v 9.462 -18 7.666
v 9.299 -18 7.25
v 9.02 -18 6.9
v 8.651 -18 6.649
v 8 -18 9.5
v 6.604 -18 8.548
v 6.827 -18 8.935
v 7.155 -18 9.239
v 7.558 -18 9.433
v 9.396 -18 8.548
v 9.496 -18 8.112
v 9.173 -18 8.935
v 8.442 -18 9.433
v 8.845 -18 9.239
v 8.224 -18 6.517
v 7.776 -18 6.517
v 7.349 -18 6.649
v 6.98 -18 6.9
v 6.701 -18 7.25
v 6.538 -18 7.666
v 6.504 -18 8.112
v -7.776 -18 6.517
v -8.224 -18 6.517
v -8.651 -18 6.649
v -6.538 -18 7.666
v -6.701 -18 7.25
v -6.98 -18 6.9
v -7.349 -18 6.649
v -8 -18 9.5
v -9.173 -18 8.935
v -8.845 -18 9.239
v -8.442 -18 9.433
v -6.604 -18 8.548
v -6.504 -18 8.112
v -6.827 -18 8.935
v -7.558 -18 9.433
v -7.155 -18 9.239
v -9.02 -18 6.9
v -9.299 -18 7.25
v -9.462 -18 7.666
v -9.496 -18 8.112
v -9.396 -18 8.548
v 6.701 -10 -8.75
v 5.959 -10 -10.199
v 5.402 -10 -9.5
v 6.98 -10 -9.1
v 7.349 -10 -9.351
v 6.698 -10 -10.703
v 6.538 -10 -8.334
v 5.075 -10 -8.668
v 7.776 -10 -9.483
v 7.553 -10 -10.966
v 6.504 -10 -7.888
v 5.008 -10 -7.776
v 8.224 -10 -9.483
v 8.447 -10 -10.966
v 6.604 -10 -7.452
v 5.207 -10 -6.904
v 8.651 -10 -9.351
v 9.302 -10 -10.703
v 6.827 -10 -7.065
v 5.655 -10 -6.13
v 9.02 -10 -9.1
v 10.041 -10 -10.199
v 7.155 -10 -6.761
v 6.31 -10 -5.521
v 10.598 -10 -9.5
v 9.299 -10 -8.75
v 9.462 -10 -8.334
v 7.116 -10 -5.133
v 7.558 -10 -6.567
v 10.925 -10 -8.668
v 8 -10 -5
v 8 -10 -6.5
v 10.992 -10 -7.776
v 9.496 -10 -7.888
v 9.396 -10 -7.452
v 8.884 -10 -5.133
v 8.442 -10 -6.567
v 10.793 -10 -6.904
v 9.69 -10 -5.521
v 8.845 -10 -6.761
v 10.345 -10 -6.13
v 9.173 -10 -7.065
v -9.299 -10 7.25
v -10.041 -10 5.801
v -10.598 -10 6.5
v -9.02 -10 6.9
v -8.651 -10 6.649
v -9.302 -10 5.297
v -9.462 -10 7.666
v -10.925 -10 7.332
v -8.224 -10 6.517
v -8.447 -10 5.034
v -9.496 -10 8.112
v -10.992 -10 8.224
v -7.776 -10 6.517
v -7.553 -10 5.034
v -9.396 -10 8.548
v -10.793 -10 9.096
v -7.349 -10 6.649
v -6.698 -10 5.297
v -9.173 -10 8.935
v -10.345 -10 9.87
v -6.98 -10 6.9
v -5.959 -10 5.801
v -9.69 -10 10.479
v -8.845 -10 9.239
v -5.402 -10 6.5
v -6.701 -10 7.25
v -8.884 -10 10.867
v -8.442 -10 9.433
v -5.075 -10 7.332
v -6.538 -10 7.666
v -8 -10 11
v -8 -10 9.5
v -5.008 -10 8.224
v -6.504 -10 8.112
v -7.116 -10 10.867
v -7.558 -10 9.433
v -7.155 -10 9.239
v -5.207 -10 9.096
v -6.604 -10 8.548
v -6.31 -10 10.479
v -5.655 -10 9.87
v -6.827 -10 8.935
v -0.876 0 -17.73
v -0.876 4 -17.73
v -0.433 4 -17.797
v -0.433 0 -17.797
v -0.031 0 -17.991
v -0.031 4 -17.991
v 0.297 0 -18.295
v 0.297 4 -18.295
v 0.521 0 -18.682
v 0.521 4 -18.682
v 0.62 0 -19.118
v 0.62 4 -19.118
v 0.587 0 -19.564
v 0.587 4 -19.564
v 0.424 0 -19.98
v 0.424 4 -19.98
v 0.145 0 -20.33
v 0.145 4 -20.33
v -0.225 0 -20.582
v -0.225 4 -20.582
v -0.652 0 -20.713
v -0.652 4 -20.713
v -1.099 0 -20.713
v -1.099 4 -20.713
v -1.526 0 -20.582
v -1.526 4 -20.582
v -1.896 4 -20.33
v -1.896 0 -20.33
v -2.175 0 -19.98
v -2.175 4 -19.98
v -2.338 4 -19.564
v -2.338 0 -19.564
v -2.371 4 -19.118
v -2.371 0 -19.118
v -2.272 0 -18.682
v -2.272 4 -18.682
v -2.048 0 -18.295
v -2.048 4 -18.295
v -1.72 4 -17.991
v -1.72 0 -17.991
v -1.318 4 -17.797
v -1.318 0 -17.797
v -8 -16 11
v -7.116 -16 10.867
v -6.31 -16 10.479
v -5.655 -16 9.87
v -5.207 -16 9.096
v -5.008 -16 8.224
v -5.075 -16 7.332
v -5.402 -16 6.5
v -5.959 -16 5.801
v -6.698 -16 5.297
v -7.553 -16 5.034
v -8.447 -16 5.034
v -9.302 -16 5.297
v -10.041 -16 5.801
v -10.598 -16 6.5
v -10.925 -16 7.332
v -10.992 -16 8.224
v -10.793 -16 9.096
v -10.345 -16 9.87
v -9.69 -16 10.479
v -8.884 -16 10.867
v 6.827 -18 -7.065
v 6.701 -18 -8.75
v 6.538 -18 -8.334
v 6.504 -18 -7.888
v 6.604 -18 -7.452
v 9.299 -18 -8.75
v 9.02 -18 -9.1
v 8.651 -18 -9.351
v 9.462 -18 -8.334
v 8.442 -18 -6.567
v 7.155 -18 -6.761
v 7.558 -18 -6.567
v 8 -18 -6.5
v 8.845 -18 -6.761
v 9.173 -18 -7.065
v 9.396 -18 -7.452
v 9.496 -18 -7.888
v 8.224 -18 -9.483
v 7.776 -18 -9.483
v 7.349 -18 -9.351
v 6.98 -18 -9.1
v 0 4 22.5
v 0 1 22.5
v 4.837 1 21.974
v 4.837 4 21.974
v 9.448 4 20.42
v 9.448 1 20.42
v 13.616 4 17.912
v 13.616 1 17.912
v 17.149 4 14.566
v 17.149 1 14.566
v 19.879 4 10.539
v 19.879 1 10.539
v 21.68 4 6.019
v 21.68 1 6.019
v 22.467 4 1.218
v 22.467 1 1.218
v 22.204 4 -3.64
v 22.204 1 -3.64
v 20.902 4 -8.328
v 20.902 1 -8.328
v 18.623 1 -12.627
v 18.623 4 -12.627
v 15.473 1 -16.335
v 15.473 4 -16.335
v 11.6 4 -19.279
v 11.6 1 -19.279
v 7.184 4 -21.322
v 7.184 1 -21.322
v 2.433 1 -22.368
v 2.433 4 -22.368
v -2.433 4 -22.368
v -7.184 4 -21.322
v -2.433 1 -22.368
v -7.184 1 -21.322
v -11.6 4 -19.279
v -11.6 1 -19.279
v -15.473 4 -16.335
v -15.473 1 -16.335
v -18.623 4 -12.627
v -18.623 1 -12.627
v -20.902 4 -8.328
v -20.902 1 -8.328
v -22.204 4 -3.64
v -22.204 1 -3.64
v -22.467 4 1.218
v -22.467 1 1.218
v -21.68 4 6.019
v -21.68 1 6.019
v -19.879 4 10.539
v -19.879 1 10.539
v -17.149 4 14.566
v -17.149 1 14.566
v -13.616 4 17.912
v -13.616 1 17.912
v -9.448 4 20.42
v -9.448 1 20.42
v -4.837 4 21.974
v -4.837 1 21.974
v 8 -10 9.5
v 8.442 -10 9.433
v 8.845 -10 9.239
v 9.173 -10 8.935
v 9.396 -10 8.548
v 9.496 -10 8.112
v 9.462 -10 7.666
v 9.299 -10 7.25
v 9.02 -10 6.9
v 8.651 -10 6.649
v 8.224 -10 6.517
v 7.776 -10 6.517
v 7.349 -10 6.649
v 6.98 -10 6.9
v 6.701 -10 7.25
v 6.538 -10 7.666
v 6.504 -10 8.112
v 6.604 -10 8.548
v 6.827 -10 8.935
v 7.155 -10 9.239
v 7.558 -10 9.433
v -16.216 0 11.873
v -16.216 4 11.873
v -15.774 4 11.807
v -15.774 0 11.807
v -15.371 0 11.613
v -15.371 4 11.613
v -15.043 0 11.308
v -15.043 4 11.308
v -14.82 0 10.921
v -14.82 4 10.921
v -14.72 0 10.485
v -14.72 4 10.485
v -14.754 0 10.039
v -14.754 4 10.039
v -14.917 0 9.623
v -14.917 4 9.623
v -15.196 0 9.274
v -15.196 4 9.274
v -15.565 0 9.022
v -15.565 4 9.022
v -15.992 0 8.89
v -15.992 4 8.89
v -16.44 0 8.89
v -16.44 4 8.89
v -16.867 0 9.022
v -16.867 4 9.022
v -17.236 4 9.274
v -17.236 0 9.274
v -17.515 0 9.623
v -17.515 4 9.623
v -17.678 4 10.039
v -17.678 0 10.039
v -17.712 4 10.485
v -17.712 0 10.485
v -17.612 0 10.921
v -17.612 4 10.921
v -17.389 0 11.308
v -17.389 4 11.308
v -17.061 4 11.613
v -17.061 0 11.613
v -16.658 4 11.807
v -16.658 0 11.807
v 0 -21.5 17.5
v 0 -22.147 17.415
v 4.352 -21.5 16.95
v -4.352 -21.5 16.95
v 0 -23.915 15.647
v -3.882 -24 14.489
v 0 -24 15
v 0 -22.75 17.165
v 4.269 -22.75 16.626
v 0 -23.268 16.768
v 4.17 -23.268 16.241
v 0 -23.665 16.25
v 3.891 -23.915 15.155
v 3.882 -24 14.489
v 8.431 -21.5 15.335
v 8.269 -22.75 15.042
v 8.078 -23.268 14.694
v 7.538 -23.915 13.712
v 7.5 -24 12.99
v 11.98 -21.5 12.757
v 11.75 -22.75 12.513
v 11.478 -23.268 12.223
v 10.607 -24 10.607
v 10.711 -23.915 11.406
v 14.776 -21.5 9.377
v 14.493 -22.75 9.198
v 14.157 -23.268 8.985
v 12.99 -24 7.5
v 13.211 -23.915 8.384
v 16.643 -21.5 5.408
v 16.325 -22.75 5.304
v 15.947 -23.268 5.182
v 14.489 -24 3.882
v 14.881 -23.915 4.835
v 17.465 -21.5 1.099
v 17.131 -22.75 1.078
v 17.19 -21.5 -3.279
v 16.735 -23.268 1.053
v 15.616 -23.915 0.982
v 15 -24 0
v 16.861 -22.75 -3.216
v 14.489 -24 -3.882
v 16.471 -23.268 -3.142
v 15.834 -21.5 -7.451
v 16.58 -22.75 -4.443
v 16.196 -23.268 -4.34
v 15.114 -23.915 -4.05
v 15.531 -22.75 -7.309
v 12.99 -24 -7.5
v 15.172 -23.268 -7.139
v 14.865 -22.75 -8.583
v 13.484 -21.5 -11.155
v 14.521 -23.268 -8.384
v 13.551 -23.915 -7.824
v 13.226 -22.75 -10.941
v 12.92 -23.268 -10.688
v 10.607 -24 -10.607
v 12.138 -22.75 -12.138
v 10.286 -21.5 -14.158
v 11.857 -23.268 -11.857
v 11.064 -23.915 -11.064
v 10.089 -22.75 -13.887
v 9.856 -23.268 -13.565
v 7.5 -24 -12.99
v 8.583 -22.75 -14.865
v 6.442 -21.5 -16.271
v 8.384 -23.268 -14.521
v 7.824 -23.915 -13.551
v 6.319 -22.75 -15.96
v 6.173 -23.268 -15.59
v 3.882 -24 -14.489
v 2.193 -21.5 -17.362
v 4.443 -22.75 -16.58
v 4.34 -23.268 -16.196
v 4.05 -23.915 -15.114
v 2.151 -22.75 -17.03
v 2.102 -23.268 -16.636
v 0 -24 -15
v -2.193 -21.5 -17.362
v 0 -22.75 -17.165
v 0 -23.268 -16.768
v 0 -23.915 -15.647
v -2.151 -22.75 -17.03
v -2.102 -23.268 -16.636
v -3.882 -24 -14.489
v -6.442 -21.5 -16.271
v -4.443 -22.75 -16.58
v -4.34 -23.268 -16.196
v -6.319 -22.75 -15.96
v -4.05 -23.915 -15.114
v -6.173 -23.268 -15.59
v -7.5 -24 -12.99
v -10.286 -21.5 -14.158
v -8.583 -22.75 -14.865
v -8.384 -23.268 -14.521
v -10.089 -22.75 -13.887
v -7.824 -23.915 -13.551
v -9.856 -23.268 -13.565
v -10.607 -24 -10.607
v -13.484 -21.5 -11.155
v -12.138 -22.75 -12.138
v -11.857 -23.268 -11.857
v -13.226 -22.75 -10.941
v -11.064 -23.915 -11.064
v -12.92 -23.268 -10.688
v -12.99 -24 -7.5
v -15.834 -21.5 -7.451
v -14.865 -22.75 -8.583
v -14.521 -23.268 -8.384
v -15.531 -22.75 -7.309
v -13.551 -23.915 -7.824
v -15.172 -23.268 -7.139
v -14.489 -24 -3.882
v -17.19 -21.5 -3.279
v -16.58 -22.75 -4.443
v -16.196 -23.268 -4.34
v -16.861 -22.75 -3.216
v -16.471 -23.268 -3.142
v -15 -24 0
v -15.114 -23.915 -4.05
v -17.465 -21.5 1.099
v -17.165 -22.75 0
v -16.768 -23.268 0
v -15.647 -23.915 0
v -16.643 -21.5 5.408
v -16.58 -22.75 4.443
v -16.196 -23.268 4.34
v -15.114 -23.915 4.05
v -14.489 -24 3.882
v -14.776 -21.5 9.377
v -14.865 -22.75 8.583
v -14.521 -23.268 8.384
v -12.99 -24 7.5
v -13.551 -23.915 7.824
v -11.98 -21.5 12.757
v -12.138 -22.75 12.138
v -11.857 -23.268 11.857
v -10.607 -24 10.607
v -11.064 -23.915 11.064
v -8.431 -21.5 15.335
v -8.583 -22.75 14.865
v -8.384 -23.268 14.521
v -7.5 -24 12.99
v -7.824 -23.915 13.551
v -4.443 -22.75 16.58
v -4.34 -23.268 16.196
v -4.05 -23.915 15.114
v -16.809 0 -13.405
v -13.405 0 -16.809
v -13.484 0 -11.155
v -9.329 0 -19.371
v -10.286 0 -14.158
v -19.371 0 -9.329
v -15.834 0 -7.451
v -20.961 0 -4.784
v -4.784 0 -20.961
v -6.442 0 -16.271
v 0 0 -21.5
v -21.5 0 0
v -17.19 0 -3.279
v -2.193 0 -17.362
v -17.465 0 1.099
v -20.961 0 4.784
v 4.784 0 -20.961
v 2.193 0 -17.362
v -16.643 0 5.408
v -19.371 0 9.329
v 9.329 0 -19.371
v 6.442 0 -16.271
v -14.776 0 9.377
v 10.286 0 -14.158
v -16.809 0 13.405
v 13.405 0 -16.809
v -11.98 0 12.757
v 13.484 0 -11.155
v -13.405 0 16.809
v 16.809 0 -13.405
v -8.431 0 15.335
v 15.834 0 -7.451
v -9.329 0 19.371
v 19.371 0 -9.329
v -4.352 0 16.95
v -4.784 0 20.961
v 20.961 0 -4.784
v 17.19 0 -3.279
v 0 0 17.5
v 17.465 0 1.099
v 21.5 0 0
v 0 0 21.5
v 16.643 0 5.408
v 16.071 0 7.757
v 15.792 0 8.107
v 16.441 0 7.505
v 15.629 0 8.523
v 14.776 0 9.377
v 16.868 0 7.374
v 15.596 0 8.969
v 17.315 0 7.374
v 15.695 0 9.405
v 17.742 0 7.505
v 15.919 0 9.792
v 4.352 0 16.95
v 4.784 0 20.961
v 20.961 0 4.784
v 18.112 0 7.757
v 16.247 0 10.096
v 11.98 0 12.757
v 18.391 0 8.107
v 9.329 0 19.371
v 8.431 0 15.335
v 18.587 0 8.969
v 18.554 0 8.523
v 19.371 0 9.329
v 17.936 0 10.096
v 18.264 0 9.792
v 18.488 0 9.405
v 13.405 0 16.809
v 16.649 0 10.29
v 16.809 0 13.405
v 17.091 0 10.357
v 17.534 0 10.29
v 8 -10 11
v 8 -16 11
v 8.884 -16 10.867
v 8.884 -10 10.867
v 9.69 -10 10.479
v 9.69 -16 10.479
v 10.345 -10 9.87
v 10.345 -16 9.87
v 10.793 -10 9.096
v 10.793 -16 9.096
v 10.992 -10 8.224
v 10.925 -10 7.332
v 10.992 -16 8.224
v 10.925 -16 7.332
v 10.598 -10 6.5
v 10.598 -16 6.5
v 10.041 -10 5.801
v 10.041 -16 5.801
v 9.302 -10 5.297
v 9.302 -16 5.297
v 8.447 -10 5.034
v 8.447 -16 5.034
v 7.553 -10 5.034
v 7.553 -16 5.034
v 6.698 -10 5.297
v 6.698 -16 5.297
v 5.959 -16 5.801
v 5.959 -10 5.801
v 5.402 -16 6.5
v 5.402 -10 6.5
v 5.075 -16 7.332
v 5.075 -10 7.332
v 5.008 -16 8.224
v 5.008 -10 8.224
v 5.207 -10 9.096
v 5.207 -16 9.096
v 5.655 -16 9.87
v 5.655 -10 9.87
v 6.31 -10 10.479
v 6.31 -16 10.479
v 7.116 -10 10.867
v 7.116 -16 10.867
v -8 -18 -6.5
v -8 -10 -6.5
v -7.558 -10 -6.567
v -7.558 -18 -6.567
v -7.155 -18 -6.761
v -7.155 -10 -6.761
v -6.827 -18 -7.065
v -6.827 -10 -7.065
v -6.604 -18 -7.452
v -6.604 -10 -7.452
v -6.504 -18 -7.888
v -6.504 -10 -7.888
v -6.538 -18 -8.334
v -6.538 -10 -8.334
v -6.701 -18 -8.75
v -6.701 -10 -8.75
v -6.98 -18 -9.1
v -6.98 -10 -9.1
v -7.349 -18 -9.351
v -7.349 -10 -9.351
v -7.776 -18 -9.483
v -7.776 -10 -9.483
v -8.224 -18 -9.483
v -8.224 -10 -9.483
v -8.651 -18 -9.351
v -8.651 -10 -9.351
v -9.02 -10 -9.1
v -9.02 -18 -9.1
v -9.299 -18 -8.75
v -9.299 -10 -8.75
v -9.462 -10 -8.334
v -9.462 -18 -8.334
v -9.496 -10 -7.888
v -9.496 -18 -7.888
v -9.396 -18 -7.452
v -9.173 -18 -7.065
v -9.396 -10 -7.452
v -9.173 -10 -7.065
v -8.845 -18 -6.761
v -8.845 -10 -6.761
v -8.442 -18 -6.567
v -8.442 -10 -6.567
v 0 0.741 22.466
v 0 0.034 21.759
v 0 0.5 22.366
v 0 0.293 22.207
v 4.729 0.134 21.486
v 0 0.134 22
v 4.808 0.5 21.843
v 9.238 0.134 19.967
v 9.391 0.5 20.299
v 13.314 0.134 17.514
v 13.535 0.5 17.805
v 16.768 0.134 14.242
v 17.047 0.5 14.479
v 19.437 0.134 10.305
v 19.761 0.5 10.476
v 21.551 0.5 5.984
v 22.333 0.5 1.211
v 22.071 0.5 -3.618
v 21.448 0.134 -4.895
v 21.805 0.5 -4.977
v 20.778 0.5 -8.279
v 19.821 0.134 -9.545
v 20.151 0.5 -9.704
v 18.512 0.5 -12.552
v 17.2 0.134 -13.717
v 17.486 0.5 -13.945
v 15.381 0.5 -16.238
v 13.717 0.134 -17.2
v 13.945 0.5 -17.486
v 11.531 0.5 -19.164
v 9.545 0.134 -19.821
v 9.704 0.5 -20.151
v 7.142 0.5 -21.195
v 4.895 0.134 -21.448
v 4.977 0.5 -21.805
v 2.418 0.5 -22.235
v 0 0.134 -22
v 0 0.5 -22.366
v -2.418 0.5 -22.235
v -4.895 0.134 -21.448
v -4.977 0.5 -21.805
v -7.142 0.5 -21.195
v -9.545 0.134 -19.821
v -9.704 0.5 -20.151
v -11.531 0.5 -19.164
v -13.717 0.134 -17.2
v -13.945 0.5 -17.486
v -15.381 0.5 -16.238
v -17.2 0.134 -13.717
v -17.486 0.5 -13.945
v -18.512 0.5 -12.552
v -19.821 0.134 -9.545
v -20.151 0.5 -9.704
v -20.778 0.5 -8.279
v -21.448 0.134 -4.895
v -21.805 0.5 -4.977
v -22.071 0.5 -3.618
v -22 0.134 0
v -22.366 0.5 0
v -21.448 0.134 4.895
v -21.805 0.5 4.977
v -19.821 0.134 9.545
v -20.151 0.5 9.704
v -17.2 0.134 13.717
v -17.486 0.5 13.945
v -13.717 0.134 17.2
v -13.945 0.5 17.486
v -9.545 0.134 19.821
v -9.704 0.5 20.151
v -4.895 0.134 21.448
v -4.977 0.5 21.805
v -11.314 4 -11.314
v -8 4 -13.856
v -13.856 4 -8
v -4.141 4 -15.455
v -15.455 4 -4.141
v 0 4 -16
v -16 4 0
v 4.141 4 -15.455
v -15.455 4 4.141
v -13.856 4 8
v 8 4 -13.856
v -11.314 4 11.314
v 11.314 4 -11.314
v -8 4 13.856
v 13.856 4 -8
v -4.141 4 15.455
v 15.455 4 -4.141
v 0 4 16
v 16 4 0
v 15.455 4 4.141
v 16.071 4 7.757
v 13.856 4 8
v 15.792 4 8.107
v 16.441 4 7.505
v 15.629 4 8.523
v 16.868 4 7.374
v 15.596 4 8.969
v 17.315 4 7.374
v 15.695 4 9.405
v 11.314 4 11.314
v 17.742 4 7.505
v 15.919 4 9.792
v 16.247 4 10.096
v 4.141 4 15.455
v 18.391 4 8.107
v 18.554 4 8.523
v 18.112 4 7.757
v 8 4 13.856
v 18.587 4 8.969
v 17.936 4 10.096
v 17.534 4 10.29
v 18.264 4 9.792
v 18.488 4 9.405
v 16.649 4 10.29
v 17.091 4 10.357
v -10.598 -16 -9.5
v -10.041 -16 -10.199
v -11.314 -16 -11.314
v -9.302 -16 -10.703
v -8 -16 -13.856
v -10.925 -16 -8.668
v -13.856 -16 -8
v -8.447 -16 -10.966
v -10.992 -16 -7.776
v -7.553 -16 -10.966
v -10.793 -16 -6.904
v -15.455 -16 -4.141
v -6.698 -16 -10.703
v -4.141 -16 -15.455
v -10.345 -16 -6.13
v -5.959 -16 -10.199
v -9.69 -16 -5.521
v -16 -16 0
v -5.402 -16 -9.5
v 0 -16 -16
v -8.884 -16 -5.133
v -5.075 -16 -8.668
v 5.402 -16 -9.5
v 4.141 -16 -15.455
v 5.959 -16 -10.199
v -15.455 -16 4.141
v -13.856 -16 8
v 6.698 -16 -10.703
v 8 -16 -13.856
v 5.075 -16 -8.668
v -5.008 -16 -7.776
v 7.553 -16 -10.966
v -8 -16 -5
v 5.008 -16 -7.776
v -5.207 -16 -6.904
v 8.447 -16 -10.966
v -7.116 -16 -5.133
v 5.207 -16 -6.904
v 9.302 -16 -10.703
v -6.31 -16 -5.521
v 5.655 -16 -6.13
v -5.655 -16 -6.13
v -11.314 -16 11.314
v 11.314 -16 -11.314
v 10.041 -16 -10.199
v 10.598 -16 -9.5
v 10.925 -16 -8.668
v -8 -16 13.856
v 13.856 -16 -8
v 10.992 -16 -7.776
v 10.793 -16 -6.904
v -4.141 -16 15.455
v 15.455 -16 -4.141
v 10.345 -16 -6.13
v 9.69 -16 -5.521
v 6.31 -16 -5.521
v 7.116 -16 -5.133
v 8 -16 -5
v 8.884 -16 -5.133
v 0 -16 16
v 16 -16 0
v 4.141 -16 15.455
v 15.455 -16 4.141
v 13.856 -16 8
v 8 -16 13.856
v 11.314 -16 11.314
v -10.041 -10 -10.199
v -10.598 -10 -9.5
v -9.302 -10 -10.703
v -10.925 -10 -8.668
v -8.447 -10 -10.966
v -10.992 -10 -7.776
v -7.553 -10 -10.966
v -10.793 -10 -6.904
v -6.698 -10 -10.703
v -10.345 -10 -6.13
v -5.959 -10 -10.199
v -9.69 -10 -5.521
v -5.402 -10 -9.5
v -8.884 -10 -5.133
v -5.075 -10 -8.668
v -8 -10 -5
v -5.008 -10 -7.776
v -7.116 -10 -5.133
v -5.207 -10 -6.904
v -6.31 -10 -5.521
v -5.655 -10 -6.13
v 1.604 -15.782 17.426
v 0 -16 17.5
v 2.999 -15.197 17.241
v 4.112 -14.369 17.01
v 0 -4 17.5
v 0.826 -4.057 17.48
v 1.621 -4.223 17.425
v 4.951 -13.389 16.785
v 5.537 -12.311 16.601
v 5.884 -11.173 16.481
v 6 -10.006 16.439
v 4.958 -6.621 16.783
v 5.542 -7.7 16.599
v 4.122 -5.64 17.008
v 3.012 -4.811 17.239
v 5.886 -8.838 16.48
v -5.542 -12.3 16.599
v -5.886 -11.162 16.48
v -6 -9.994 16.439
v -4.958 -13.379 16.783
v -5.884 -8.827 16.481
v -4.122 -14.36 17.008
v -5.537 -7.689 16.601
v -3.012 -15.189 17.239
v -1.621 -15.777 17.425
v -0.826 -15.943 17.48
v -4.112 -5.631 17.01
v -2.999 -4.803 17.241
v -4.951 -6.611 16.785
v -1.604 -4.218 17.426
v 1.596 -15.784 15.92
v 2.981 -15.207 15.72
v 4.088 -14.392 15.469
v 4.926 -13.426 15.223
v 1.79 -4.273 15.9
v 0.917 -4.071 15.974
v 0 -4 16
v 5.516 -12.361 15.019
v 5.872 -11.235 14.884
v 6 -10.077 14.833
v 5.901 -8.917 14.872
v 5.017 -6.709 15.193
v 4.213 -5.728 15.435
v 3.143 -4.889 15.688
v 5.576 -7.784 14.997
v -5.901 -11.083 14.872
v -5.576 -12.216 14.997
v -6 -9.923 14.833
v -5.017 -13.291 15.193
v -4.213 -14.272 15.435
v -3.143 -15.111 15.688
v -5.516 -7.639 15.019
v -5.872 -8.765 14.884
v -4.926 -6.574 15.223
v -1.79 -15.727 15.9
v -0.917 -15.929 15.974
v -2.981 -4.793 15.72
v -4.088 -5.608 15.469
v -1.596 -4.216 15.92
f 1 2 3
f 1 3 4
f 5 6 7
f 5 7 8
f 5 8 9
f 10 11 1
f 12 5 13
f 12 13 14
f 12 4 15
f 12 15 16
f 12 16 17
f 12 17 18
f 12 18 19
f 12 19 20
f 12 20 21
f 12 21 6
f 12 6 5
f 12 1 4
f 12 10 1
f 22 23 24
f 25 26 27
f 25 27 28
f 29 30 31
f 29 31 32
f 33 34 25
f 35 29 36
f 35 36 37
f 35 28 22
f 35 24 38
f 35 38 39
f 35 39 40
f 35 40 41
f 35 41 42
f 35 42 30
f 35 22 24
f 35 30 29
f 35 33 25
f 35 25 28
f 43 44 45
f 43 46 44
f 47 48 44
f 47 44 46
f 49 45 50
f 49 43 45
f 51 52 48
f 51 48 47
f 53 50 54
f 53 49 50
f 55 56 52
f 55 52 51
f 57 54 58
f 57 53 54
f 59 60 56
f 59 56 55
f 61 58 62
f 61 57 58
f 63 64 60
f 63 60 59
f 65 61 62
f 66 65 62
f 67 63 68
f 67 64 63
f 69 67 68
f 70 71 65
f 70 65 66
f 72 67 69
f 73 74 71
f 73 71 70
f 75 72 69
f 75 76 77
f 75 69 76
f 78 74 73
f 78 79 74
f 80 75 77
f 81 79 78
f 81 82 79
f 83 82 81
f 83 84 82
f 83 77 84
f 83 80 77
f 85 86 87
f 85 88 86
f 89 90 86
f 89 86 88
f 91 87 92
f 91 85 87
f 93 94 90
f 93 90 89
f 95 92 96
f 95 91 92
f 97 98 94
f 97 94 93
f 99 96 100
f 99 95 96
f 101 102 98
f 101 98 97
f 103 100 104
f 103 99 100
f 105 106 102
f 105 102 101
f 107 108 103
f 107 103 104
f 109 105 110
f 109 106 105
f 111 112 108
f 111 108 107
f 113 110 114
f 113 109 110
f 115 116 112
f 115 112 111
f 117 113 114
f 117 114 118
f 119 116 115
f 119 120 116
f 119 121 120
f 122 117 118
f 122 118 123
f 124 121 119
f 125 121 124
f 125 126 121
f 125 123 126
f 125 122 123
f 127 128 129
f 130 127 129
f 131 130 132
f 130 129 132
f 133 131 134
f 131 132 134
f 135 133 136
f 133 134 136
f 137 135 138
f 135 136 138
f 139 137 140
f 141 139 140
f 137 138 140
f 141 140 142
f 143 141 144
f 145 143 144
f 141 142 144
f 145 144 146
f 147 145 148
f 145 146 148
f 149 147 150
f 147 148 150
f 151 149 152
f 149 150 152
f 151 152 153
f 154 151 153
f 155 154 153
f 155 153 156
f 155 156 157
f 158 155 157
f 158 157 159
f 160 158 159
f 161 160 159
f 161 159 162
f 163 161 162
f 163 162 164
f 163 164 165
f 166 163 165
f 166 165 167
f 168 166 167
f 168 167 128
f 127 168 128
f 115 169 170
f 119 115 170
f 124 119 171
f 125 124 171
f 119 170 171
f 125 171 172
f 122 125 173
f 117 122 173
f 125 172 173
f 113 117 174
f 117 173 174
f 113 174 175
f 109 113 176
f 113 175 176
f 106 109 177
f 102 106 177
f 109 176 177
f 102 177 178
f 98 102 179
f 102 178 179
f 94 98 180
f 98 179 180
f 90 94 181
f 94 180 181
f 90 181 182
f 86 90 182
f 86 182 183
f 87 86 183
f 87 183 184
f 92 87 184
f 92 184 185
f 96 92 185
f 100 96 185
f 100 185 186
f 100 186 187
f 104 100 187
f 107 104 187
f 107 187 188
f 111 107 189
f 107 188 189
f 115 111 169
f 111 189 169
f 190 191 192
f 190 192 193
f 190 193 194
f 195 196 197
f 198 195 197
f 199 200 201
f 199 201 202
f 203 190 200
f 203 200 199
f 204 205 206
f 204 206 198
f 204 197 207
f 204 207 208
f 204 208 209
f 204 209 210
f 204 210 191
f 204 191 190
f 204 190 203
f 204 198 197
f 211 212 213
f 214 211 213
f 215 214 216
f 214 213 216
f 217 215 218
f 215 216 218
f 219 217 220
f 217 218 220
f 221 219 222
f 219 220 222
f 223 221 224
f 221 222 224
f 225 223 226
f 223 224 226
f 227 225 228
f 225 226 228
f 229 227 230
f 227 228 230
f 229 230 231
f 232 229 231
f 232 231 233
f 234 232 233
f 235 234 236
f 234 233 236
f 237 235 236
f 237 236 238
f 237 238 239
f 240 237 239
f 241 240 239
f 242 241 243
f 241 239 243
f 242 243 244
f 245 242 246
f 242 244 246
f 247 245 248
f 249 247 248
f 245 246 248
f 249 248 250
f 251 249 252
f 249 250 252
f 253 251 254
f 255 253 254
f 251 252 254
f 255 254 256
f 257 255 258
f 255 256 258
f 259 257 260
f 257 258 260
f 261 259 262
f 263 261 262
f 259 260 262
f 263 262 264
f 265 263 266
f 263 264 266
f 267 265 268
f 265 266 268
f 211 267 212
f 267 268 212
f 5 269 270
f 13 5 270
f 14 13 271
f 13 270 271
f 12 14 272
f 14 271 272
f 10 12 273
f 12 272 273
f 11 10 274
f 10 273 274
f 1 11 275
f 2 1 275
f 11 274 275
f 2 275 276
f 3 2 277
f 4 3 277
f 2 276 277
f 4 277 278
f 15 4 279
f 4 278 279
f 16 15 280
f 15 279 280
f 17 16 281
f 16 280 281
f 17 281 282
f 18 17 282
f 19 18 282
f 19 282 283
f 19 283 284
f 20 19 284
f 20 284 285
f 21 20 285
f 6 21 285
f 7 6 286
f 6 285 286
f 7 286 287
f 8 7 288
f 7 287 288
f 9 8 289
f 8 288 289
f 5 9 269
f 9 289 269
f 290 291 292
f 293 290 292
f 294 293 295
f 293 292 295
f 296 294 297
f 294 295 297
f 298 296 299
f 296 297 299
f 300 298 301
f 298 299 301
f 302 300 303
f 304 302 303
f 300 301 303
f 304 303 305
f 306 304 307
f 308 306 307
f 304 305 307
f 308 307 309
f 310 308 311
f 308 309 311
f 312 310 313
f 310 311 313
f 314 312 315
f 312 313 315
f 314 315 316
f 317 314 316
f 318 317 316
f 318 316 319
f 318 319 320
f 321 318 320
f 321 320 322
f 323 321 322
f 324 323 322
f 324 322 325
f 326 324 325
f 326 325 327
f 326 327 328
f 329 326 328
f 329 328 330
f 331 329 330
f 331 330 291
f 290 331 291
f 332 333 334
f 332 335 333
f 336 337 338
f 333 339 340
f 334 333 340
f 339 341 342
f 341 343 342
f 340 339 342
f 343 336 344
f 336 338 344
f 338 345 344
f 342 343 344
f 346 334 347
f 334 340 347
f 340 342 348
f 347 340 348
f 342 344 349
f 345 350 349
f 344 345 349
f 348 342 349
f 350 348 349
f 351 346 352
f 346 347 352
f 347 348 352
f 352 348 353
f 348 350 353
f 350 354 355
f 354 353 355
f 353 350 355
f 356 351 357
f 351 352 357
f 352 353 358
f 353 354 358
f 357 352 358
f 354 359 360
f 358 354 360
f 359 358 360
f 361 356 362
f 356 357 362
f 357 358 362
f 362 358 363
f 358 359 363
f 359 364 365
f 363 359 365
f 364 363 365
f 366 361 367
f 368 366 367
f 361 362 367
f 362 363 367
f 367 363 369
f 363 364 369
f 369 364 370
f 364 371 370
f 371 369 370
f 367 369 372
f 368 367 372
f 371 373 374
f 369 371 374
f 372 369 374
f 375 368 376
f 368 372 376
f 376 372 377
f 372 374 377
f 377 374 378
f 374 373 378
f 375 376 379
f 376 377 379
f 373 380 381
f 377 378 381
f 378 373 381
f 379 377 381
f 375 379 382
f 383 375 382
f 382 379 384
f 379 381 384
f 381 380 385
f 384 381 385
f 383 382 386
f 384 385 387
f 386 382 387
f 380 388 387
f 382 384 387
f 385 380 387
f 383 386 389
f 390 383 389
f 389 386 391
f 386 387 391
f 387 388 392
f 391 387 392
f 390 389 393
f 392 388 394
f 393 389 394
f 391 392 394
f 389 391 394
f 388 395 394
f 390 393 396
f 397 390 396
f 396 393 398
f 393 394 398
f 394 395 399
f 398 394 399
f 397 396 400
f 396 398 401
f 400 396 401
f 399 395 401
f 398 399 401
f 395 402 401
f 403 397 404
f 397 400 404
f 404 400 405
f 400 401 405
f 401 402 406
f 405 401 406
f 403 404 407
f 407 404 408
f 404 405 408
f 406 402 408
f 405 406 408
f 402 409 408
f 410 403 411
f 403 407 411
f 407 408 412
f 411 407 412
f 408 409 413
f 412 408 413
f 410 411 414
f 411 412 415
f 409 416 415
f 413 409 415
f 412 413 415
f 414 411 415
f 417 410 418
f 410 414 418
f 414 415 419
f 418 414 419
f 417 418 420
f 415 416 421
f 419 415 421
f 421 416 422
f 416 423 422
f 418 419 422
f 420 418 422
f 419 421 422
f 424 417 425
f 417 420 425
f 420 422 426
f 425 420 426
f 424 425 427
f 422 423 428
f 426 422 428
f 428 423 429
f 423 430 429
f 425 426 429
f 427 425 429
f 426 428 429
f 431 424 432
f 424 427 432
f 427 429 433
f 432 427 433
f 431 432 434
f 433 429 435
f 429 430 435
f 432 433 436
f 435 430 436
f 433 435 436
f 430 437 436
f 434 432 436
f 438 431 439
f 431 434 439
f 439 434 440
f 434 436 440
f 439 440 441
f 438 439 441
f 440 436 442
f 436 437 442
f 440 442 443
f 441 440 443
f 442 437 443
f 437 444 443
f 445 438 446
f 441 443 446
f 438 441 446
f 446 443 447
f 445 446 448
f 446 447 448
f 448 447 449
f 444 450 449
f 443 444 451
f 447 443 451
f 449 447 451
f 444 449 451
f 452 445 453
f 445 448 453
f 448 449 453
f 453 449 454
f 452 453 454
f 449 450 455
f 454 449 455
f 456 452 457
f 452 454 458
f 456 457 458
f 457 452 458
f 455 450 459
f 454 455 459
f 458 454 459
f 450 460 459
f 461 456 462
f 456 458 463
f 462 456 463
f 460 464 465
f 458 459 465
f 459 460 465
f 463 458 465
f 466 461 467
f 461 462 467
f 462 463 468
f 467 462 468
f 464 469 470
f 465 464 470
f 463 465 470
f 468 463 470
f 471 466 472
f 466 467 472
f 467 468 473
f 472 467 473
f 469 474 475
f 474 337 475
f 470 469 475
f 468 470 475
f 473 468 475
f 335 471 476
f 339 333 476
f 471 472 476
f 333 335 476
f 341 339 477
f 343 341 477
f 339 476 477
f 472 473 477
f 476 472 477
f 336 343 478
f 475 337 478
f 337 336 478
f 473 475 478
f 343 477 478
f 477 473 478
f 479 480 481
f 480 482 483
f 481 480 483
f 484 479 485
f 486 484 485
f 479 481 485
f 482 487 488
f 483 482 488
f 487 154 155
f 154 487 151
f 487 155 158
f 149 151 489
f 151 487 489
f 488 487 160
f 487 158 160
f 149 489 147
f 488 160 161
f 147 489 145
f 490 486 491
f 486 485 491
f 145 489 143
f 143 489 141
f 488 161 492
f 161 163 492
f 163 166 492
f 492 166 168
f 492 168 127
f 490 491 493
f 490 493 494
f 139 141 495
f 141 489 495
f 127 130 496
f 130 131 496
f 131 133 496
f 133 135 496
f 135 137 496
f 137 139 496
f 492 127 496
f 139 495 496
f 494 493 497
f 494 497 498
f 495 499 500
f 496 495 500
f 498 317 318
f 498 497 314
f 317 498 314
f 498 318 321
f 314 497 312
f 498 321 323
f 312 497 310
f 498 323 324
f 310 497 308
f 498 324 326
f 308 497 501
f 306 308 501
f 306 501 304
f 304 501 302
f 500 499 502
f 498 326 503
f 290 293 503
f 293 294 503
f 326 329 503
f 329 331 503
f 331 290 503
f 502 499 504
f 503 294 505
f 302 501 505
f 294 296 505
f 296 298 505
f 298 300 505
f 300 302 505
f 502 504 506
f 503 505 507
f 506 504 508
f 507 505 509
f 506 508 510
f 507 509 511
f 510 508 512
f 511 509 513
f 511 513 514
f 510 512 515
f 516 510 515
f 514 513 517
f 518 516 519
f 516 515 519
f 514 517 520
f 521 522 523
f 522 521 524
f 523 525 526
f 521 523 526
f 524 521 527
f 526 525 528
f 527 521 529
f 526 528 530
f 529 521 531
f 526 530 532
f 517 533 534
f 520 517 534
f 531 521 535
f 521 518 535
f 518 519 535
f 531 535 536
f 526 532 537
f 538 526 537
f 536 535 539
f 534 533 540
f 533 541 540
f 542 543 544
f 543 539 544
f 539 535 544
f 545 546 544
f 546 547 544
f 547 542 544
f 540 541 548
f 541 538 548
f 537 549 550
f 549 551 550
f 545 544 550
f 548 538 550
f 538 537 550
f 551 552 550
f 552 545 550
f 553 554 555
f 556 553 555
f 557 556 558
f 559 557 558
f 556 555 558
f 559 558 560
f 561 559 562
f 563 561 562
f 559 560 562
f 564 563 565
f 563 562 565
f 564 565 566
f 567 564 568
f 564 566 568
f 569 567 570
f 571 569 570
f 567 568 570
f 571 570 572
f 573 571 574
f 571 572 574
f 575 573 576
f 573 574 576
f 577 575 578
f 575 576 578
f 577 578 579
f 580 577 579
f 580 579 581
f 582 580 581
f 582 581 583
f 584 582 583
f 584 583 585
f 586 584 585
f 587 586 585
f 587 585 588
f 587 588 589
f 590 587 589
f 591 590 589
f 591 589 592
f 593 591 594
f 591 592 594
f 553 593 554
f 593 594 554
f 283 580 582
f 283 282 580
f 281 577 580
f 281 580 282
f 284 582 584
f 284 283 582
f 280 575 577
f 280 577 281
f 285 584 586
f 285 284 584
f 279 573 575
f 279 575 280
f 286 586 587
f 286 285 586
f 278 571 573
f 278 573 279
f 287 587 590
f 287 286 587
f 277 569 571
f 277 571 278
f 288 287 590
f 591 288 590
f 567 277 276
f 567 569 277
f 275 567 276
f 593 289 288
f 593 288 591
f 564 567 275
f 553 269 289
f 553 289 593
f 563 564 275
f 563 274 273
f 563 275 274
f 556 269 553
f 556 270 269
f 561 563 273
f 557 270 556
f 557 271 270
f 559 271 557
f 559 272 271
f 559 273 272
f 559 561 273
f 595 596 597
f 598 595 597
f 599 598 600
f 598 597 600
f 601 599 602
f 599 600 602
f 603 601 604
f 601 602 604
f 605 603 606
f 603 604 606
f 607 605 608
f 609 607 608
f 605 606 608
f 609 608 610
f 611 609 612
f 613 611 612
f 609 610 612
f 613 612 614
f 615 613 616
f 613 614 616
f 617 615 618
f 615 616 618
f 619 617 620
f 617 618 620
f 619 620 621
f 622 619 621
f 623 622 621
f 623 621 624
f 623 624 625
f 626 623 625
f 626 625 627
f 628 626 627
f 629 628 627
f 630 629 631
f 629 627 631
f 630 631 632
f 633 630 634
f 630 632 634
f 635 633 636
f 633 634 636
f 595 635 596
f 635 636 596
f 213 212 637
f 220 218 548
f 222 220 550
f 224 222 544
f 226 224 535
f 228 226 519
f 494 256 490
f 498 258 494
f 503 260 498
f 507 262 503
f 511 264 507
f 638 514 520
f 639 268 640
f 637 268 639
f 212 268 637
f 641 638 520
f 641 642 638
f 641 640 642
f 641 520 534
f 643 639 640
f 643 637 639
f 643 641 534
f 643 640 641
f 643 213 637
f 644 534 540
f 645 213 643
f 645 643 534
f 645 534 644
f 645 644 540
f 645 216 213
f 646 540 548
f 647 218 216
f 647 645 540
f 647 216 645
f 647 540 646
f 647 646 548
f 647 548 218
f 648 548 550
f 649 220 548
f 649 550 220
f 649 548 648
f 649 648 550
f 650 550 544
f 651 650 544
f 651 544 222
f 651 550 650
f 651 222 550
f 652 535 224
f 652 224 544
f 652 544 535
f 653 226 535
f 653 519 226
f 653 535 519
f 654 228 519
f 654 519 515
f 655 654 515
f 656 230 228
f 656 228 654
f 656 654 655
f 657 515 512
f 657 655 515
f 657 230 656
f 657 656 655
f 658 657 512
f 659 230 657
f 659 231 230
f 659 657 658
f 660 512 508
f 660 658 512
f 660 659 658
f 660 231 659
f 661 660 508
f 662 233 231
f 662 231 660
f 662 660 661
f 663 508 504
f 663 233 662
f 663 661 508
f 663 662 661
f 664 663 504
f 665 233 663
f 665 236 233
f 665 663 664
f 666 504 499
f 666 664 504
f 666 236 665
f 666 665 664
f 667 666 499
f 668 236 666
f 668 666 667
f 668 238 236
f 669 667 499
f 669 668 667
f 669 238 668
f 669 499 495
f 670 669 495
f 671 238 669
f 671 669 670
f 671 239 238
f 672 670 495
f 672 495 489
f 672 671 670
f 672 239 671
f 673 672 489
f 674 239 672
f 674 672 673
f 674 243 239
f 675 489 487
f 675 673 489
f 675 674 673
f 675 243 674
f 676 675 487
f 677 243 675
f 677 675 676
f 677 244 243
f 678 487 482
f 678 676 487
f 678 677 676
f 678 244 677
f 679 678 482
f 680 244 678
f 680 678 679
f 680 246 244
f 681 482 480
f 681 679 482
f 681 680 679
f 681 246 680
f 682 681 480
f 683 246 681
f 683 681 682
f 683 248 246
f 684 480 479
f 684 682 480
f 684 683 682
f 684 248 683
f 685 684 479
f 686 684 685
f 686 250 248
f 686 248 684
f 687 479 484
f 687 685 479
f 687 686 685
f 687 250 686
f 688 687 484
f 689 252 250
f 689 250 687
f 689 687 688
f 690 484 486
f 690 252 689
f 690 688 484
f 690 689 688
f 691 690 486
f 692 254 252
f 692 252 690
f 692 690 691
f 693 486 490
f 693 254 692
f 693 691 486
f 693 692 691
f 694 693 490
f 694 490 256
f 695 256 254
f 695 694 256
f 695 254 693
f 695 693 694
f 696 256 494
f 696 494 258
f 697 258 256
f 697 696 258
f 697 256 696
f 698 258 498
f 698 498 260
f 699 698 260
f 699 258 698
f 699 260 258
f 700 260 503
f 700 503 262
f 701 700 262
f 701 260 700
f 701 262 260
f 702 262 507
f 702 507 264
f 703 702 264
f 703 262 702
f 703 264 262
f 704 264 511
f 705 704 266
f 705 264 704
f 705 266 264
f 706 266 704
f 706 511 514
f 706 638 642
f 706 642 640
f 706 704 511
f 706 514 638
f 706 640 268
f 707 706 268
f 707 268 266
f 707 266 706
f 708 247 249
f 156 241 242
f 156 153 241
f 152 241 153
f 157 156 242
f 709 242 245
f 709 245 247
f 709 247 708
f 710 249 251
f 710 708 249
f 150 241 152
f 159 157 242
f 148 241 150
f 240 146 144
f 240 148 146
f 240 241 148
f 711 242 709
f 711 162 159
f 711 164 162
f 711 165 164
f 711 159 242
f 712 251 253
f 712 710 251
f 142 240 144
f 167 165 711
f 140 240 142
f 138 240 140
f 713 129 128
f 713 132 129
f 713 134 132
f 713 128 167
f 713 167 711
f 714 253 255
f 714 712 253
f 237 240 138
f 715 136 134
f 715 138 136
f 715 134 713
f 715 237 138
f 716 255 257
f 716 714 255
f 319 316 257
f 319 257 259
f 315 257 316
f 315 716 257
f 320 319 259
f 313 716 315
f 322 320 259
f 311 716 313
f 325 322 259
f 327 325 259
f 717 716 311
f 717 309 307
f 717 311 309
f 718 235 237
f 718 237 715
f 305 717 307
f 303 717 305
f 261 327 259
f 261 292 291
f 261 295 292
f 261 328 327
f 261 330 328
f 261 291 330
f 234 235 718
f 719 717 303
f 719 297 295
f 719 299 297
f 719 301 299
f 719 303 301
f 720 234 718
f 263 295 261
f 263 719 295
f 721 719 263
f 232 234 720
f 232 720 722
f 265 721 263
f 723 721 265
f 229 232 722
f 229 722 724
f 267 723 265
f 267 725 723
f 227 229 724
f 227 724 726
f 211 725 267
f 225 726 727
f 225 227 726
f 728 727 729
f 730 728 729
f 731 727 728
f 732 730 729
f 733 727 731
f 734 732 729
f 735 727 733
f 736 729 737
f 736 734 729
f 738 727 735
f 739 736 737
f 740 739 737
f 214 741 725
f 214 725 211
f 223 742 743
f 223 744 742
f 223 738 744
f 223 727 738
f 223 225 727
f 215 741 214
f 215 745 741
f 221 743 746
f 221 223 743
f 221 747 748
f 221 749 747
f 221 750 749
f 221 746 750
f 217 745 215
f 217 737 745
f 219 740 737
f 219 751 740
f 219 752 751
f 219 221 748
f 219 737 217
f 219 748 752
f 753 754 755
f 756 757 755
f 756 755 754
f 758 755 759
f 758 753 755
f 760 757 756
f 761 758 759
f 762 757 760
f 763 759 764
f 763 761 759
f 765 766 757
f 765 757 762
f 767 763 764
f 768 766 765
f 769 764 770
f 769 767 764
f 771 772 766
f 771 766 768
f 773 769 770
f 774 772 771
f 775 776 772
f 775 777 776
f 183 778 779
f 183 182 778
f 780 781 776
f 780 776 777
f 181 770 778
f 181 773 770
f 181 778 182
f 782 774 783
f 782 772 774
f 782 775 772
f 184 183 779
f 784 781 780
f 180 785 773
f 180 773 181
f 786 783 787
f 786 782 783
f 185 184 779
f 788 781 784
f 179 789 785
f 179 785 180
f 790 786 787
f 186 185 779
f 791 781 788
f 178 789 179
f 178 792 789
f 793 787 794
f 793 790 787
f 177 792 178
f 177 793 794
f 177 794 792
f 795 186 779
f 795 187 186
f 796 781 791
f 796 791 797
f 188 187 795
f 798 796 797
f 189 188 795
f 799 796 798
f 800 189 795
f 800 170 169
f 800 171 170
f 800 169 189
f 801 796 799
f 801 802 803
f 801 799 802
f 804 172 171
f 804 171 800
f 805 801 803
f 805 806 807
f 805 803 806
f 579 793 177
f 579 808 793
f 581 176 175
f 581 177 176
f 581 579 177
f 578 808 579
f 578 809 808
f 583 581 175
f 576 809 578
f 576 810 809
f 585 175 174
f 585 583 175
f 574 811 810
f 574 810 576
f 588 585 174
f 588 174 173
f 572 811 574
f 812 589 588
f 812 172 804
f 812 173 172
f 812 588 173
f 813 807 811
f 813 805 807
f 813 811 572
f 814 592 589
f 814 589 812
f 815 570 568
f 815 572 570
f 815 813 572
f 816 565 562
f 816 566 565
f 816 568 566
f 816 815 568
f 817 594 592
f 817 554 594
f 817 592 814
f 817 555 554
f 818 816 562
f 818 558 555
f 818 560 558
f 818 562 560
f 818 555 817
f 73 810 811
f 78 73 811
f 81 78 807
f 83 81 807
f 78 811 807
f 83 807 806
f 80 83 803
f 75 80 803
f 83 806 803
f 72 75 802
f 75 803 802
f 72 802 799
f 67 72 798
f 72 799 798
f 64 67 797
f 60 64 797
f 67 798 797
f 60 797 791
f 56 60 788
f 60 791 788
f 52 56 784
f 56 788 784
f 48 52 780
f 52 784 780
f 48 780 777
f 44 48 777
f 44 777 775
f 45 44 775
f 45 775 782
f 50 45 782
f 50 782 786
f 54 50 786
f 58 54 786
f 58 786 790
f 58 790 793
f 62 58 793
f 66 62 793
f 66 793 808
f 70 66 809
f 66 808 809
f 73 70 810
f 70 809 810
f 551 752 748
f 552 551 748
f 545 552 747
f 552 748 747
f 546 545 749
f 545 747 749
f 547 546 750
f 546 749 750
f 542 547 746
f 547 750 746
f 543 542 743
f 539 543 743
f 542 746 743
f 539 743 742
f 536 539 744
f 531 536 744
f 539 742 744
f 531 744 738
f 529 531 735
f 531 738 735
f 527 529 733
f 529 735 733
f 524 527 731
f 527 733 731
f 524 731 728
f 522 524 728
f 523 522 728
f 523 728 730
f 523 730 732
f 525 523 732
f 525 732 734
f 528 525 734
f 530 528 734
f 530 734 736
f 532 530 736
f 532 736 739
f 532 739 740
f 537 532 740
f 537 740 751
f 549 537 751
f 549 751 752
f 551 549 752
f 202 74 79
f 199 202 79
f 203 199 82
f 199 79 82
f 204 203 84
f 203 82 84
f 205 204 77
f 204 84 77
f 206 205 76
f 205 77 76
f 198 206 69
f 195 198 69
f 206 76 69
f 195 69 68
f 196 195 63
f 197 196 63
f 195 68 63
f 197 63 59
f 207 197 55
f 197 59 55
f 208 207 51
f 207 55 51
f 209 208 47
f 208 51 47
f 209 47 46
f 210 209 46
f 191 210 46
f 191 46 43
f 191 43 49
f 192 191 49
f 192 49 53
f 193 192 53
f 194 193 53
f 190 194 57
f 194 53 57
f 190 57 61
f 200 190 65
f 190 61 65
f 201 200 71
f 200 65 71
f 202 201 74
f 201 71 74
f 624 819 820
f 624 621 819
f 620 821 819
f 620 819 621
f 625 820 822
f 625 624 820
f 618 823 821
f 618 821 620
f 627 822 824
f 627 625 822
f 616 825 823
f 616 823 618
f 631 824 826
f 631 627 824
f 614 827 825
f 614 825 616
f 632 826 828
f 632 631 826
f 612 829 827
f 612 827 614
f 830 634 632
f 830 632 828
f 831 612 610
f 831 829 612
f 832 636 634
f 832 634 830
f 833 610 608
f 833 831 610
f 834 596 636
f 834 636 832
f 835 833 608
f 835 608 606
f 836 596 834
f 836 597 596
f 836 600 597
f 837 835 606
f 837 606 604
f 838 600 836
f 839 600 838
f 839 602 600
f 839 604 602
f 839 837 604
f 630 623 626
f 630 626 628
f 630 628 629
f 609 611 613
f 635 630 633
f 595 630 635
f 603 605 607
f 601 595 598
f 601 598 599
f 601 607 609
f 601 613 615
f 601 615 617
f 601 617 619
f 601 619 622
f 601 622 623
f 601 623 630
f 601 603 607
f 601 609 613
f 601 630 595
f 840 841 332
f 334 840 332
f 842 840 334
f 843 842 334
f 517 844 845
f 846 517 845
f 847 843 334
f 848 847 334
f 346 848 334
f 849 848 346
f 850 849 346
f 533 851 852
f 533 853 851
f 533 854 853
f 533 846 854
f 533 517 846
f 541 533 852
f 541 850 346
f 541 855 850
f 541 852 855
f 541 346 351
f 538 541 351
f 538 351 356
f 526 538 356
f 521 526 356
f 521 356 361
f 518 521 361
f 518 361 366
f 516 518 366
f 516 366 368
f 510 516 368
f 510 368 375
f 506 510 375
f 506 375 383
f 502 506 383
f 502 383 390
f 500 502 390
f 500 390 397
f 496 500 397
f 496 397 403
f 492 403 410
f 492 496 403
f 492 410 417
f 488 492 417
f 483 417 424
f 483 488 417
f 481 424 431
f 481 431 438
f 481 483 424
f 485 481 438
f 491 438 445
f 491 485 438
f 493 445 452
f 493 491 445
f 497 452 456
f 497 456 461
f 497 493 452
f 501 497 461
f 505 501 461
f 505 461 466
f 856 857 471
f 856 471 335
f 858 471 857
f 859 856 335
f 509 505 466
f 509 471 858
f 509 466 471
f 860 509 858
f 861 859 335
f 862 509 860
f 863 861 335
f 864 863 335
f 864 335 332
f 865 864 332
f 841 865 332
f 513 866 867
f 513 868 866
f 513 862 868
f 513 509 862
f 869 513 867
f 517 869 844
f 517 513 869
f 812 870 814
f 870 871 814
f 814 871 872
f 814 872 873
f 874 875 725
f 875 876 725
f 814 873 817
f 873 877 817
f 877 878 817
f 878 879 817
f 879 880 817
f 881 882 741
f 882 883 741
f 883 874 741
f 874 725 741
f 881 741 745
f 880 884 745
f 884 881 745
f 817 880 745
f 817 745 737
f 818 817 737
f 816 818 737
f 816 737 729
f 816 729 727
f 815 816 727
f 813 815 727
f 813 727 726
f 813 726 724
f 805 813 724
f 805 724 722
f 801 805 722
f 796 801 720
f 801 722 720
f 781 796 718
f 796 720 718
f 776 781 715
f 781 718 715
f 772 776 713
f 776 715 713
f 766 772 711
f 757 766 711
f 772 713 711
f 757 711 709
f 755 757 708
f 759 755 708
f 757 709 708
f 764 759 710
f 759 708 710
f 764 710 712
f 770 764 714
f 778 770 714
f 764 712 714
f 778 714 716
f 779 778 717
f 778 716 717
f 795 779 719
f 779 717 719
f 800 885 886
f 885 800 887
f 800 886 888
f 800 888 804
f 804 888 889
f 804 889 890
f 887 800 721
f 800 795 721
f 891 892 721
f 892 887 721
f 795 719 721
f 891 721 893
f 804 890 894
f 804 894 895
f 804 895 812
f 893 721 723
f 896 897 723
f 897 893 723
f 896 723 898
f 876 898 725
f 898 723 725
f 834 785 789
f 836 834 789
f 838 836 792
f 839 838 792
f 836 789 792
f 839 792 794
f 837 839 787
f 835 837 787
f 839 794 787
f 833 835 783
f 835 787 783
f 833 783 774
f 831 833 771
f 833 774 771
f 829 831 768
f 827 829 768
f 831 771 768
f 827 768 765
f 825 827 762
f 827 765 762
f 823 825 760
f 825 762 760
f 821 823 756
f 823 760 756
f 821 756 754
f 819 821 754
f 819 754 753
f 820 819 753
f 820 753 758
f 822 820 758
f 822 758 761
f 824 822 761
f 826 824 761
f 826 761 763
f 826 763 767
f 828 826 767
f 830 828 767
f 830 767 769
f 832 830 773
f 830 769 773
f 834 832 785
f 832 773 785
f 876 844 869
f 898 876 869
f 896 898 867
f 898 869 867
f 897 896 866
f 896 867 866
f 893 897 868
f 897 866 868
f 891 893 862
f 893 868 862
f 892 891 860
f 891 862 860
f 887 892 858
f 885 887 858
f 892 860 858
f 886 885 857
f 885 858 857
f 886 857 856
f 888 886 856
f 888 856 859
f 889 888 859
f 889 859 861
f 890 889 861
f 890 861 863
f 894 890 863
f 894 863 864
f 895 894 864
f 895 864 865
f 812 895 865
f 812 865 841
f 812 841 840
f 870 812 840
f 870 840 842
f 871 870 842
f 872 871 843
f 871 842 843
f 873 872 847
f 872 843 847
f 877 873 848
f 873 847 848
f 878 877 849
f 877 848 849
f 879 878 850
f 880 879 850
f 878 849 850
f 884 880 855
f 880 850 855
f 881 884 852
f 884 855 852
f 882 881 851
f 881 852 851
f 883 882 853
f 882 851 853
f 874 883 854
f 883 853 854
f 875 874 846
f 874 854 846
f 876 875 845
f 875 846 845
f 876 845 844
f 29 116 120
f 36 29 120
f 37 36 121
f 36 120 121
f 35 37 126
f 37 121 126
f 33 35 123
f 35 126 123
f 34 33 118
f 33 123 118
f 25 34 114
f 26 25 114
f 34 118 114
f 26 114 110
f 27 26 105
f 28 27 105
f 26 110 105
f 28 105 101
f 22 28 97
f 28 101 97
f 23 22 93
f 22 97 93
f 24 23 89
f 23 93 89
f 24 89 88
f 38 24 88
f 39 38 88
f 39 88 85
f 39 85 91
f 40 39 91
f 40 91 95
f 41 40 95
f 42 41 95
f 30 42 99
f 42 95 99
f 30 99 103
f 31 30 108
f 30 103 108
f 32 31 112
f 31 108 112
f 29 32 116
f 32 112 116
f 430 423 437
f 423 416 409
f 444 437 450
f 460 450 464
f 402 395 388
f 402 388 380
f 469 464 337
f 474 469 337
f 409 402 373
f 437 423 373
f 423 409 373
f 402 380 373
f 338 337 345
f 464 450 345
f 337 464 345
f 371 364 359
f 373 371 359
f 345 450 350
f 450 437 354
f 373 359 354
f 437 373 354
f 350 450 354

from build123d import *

# Parameters (mm, degrees)
SKETCH1_R               = 22.5
BOSS_EXTRUDE1_DEPTH     = 4
SKETCH2_R               = 17.5
BOSS_EXTRUDE2_DEPTH     = 24
SKETCH3_R               = 16
CUT_EXTRUDE1_DEPTH      = 20
SKETCH4_R               = 3
BOSS_EXTRUDE3_DEPTH     = 6
SKETCH6_R               = 1.5
CUT_EXTRUDE3_DEPTH      = 8
SKETCH7_R               = 1.5
CUT_EXTRUDE4_DEPTH      = 10
CUT_EXTRUDE5_REACH      = 53.79
CUT_EXTRUDE5_END_RADIUS = 16
SKETCH10_R              = 6
FILLET1_R               = 2.5
FILLET2_R               = 1


with BuildPart() as part:
    # Sketch1 → Boss-Extrude1 (new body)
    with BuildSketch(Plane(origin=(0, 0, 0), x_dir=(1, 0, 0), z_dir=(0, 1, 0))):
        with Locations(Location((0, 0, 0), (0, 0, 270))):
            Circle(SKETCH1_R)
    extrude(amount=BOSS_EXTRUDE1_DEPTH)

    # Sketch2 → Boss-Extrude2 (add)
    with BuildSketch(Plane(origin=(0, 0, 0), x_dir=(1, 0, 0), z_dir=(0, 1, 0))):
        with Locations(Location((0, 0, 0), (0, 0, 270))):
            Circle(SKETCH2_R)
    extrude(amount=-BOSS_EXTRUDE2_DEPTH)

    # Sketch3 → Cut-Extrude1 (cut)
    with BuildSketch(Plane(origin=(0, 4, 0), x_dir=(1, 0, 0), z_dir=(0, 1, 0))):
        with Locations(Location((0, 0, 0), (0, 0, 270))):
            Circle(SKETCH3_R)
    extrude(amount=-CUT_EXTRUDE1_DEPTH, mode=Mode.SUBTRACT)

    # Sketch4 → Boss-Extrude3 (add)
    with BuildSketch(Plane(origin=(0, -16, 0), x_dir=(1, 0, 0), z_dir=(0, 1, 0))):
        with Locations(Location((-8, 8, 0), (0, 0, 270))):
            Circle(SKETCH4_R)
        with Locations(Location((8, 8, 0), (0, 0, 270))):
            Circle(SKETCH4_R)
        with Locations(Location((-8, -8, 0), (0, 0, 270))):
            Circle(SKETCH4_R)
        with Locations(Location((8, -8, 0), (0, 0, 270))):
            Circle(SKETCH4_R)
    extrude(amount=BOSS_EXTRUDE3_DEPTH)

    # Sketch6 → Cut-Extrude3 (cut)
    with BuildSketch(Plane(origin=(0, -10, 0), x_dir=(1, 0, 0), z_dir=(0, 1, 0))):
        with Locations(Location((-8, 8, 0), (0, 0, 270))):
            Circle(SKETCH6_R)
        with Locations(Location((8, 8, 0), (0, 0, 270))):
            Circle(SKETCH6_R)
        with Locations(Location((8, -8, 0), (0, 0, 270))):
            Circle(SKETCH6_R)
        with Locations(Location((-8, -8, 0), (0, 0, 270))):
            Circle(SKETCH6_R)
    extrude(amount=-CUT_EXTRUDE3_DEPTH, mode=Mode.SUBTRACT)

    # Sketch7 → Cut-Extrude4 (cut)
    with BuildSketch(Plane(origin=(0, 4, 0), x_dir=(1, 0, 0), z_dir=(0, 1, 0))):
        with Locations(Location((-0.875515832, 19.230079876, 0), (0, 0, 270))):
            Circle(SKETCH7_R)
        with Locations(Location((17.091495605, -8.856820986, 0), (0, 0, 270))):
            Circle(SKETCH7_R)
        with Locations(Location((-16.215979773, -10.37325889, 0), (0, 0, 270))):
            Circle(SKETCH7_R)
    extrude(amount=-CUT_EXTRUDE4_DEPTH, mode=Mode.SUBTRACT)

    # Cut-Extrude5: up to this cylinder (the profile starts outside it)
    cut_extrude5_end = Plane(origin=(0, -10, 0), z_dir=(0, 1, 0)) * Cylinder(CUT_EXTRUDE5_END_RADIUS, 140.58, mode=Mode.PRIVATE)
    # Sketch10 → Cut-Extrude5 (cut, up to the surface)
    with BuildSketch(Plane.XY.offset(17.5), mode=Mode.PRIVATE) as cut_extrude5_sk1:
        with Locations(Location((0, -10, 0), (0, 0, 90))):
            Circle(SKETCH10_R)
    cut_extrude5_tool1 = extrude(cut_extrude5_sk1.sketch, amount=-CUT_EXTRUDE5_REACH, mode=Mode.PRIVATE) - cut_extrude5_end
    add(cut_extrude5_tool1.solids().sort_by_distance((0, -10, 17.5))[0], mode=Mode.SUBTRACT)

    # Fillet1
    fillet1_edges = [part.edges().sort_by_distance(p)[0] for p in [
        (0, -24, -17.5),
    ]]
    fillet(fillet1_edges, radius=FILLET1_R)

    # Fillet2
    fillet2_edges = [part.edges().sort_by_distance(p)[0] for p in [
        (0, 0, -22.5),
    ]]
    fillet(fillet2_edges, radius=FILLET2_R)


solid = part.part
